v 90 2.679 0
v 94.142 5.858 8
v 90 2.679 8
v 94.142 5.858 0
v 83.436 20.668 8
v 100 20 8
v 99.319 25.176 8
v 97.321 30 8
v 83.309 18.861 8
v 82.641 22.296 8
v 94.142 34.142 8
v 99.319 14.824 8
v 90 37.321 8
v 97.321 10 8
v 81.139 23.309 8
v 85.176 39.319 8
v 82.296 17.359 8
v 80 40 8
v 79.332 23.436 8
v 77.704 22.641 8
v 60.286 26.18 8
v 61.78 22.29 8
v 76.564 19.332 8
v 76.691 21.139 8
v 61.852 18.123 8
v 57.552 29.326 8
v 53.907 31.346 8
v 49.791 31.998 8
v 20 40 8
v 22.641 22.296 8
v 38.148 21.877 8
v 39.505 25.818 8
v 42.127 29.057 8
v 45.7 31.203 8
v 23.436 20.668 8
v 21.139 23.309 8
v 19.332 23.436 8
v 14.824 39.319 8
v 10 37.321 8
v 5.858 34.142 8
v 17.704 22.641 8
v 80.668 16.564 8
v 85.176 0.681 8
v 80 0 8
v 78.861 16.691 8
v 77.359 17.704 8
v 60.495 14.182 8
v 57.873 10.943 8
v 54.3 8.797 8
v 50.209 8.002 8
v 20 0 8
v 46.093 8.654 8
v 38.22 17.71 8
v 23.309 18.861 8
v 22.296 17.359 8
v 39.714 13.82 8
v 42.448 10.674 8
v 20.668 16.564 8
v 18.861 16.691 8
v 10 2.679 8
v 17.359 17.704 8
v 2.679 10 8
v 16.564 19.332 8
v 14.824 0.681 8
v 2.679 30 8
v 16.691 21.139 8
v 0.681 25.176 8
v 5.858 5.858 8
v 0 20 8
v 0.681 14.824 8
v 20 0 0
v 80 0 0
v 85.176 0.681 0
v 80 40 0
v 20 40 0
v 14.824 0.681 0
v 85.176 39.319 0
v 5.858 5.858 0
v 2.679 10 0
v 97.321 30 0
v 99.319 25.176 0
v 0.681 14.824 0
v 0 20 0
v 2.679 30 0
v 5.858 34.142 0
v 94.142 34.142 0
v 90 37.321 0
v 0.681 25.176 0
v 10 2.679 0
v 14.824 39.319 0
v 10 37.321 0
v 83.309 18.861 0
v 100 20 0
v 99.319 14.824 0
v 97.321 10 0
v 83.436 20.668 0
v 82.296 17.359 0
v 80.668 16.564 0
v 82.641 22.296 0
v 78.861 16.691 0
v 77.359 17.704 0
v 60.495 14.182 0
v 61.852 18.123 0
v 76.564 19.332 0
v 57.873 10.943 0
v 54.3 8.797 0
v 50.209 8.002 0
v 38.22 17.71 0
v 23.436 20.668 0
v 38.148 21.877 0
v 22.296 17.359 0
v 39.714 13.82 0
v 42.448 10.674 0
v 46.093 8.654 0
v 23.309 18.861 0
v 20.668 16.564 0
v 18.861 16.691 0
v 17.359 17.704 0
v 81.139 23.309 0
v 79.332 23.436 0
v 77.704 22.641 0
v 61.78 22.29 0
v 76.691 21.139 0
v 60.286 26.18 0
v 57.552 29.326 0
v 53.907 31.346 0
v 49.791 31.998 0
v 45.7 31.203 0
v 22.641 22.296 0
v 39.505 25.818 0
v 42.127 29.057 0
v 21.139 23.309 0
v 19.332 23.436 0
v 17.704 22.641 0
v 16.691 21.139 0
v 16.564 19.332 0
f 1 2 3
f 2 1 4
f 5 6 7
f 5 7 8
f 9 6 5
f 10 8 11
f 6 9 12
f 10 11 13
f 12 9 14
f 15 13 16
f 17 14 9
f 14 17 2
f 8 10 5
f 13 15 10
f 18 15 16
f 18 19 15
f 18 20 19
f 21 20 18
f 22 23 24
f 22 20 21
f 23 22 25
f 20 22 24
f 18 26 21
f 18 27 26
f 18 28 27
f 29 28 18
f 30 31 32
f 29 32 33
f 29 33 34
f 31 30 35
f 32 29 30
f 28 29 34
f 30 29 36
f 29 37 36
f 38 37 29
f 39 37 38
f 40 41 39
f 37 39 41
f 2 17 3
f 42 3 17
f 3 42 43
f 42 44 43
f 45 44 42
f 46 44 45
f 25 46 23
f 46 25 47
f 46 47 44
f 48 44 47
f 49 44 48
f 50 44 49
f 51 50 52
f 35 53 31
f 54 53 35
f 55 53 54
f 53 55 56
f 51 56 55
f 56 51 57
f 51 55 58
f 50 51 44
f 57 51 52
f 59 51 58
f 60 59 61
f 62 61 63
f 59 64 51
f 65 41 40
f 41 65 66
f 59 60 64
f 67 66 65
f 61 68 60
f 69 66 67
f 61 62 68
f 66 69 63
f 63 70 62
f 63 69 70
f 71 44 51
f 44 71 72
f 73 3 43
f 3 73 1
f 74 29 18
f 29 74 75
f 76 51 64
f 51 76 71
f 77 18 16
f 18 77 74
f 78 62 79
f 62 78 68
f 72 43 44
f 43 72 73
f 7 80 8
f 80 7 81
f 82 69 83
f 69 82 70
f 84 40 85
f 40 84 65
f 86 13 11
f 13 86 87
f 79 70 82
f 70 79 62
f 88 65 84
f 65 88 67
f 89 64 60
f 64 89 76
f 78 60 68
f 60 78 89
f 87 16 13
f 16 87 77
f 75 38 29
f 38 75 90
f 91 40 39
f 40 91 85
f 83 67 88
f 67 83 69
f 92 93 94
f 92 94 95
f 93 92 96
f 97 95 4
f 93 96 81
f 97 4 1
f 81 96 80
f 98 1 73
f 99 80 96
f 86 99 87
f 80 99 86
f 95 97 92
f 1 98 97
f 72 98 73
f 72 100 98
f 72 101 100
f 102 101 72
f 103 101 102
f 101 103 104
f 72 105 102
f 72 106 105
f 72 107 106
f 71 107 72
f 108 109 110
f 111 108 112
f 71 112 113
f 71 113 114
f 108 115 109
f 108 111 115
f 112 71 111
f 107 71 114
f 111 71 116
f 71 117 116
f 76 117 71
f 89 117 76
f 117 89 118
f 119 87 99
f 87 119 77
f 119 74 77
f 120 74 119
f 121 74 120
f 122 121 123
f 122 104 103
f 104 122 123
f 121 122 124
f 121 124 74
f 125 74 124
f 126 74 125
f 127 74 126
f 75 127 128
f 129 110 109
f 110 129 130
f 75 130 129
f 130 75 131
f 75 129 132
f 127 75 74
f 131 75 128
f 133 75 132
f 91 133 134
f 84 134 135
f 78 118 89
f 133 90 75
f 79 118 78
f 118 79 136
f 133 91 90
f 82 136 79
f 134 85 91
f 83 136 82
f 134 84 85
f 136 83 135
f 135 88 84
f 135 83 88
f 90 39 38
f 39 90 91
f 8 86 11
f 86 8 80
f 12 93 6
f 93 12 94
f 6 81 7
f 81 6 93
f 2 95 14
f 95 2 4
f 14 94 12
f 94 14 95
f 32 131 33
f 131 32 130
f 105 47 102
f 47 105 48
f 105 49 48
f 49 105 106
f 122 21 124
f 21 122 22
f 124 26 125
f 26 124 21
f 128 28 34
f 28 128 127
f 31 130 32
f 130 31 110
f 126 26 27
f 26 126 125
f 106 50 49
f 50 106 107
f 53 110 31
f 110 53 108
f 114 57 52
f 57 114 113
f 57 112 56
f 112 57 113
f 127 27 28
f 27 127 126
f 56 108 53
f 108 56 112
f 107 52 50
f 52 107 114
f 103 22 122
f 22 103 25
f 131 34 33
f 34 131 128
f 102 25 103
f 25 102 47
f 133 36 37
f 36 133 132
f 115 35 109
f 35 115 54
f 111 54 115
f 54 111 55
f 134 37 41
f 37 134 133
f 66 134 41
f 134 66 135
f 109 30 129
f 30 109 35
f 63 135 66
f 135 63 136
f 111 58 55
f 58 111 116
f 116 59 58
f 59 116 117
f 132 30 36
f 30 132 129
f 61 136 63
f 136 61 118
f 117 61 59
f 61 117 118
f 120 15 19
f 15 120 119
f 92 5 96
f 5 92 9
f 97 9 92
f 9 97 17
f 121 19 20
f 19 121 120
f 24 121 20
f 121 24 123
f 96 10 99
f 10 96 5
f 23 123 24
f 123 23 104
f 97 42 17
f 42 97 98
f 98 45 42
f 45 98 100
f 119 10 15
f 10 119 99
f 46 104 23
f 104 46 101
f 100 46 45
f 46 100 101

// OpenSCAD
$fn = 32;

// ----------------------------------------------------------------------
// Spacer plate: obround span 60, caps R20
// ----------------------------------------------------------------------

// --- parameters (mm) ---
bore_r = 12;              // centre bore radius
bolt_r = 3.5;             // bolt hole radius
plate_t = 8;              // plate thickness, Z (extrusion height)
span = 60;                // obround span
cap_r = 20;               // cap radius

profile = [[20, 40], [14.824, 39.319], [10, 37.321], [5.858, 34.142], [2.679, 30], [0.681, 25.176], [0, 20], [0.681, 14.824], [2.679, 10], [5.858, 5.858], [10, 2.679], [14.824, 0.681], [20, 0], [80, 0], [85.176, 0.681], [90, 2.679], [94.142, 5.858], [97.321, 10], [99.319, 14.824], [100, 20], [99.319, 25.176], [97.321, 30], [94.142, 34.142], [90, 37.321], [85.176, 39.319], [80, 40]];  // primary outline, 26 points, counter clockwise
void_1 = [[61.78, 22.29], [60.286, 26.18], [57.552, 29.326], [53.907, 31.346], [49.791, 31.998], [45.7, 31.203], [42.127, 29.057], [39.505, 25.818], [38.148, 21.877], [38.22, 17.71], [39.714, 13.82], [42.448, 10.674], [46.093, 8.654], [50.209, 8.002], [54.3, 8.797], [57.873, 10.943], [60.495, 14.182], [61.852, 18.123]];  // centre bore, 18 points
void_2 = [[23.436, 20.668], [22.641, 22.296], [21.139, 23.309], [19.332, 23.436], [17.704, 22.641], [16.691, 21.139], [16.564, 19.332], [17.359, 17.704], [18.861, 16.691], [20.668, 16.564], [22.296, 17.359], [23.309, 18.861]];  // end hole, 12 points
void_3 = [[83.436, 20.668], [82.641, 22.296], [81.139, 23.309], [79.332, 23.436], [77.704, 22.641], [76.691, 21.139], [76.564, 19.332], [77.359, 17.704], [78.861, 16.691], [80.668, 16.564], [82.296, 17.359], [83.309, 18.861]];  // end hole, 12 points

// --- the one profile operation ---
difference() {
  linear_extrude(height = plate_t) polygon(points = profile);
  translate([0, 0, -1])
    linear_extrude(height = plate_t + 2) polygon(points = void_1);
  translate([0, 0, -1])
    linear_extrude(height = plate_t + 2) polygon(points = void_2);
  translate([0, 0, -1])
    linear_extrude(height = plate_t + 2) polygon(points = void_3);
}
